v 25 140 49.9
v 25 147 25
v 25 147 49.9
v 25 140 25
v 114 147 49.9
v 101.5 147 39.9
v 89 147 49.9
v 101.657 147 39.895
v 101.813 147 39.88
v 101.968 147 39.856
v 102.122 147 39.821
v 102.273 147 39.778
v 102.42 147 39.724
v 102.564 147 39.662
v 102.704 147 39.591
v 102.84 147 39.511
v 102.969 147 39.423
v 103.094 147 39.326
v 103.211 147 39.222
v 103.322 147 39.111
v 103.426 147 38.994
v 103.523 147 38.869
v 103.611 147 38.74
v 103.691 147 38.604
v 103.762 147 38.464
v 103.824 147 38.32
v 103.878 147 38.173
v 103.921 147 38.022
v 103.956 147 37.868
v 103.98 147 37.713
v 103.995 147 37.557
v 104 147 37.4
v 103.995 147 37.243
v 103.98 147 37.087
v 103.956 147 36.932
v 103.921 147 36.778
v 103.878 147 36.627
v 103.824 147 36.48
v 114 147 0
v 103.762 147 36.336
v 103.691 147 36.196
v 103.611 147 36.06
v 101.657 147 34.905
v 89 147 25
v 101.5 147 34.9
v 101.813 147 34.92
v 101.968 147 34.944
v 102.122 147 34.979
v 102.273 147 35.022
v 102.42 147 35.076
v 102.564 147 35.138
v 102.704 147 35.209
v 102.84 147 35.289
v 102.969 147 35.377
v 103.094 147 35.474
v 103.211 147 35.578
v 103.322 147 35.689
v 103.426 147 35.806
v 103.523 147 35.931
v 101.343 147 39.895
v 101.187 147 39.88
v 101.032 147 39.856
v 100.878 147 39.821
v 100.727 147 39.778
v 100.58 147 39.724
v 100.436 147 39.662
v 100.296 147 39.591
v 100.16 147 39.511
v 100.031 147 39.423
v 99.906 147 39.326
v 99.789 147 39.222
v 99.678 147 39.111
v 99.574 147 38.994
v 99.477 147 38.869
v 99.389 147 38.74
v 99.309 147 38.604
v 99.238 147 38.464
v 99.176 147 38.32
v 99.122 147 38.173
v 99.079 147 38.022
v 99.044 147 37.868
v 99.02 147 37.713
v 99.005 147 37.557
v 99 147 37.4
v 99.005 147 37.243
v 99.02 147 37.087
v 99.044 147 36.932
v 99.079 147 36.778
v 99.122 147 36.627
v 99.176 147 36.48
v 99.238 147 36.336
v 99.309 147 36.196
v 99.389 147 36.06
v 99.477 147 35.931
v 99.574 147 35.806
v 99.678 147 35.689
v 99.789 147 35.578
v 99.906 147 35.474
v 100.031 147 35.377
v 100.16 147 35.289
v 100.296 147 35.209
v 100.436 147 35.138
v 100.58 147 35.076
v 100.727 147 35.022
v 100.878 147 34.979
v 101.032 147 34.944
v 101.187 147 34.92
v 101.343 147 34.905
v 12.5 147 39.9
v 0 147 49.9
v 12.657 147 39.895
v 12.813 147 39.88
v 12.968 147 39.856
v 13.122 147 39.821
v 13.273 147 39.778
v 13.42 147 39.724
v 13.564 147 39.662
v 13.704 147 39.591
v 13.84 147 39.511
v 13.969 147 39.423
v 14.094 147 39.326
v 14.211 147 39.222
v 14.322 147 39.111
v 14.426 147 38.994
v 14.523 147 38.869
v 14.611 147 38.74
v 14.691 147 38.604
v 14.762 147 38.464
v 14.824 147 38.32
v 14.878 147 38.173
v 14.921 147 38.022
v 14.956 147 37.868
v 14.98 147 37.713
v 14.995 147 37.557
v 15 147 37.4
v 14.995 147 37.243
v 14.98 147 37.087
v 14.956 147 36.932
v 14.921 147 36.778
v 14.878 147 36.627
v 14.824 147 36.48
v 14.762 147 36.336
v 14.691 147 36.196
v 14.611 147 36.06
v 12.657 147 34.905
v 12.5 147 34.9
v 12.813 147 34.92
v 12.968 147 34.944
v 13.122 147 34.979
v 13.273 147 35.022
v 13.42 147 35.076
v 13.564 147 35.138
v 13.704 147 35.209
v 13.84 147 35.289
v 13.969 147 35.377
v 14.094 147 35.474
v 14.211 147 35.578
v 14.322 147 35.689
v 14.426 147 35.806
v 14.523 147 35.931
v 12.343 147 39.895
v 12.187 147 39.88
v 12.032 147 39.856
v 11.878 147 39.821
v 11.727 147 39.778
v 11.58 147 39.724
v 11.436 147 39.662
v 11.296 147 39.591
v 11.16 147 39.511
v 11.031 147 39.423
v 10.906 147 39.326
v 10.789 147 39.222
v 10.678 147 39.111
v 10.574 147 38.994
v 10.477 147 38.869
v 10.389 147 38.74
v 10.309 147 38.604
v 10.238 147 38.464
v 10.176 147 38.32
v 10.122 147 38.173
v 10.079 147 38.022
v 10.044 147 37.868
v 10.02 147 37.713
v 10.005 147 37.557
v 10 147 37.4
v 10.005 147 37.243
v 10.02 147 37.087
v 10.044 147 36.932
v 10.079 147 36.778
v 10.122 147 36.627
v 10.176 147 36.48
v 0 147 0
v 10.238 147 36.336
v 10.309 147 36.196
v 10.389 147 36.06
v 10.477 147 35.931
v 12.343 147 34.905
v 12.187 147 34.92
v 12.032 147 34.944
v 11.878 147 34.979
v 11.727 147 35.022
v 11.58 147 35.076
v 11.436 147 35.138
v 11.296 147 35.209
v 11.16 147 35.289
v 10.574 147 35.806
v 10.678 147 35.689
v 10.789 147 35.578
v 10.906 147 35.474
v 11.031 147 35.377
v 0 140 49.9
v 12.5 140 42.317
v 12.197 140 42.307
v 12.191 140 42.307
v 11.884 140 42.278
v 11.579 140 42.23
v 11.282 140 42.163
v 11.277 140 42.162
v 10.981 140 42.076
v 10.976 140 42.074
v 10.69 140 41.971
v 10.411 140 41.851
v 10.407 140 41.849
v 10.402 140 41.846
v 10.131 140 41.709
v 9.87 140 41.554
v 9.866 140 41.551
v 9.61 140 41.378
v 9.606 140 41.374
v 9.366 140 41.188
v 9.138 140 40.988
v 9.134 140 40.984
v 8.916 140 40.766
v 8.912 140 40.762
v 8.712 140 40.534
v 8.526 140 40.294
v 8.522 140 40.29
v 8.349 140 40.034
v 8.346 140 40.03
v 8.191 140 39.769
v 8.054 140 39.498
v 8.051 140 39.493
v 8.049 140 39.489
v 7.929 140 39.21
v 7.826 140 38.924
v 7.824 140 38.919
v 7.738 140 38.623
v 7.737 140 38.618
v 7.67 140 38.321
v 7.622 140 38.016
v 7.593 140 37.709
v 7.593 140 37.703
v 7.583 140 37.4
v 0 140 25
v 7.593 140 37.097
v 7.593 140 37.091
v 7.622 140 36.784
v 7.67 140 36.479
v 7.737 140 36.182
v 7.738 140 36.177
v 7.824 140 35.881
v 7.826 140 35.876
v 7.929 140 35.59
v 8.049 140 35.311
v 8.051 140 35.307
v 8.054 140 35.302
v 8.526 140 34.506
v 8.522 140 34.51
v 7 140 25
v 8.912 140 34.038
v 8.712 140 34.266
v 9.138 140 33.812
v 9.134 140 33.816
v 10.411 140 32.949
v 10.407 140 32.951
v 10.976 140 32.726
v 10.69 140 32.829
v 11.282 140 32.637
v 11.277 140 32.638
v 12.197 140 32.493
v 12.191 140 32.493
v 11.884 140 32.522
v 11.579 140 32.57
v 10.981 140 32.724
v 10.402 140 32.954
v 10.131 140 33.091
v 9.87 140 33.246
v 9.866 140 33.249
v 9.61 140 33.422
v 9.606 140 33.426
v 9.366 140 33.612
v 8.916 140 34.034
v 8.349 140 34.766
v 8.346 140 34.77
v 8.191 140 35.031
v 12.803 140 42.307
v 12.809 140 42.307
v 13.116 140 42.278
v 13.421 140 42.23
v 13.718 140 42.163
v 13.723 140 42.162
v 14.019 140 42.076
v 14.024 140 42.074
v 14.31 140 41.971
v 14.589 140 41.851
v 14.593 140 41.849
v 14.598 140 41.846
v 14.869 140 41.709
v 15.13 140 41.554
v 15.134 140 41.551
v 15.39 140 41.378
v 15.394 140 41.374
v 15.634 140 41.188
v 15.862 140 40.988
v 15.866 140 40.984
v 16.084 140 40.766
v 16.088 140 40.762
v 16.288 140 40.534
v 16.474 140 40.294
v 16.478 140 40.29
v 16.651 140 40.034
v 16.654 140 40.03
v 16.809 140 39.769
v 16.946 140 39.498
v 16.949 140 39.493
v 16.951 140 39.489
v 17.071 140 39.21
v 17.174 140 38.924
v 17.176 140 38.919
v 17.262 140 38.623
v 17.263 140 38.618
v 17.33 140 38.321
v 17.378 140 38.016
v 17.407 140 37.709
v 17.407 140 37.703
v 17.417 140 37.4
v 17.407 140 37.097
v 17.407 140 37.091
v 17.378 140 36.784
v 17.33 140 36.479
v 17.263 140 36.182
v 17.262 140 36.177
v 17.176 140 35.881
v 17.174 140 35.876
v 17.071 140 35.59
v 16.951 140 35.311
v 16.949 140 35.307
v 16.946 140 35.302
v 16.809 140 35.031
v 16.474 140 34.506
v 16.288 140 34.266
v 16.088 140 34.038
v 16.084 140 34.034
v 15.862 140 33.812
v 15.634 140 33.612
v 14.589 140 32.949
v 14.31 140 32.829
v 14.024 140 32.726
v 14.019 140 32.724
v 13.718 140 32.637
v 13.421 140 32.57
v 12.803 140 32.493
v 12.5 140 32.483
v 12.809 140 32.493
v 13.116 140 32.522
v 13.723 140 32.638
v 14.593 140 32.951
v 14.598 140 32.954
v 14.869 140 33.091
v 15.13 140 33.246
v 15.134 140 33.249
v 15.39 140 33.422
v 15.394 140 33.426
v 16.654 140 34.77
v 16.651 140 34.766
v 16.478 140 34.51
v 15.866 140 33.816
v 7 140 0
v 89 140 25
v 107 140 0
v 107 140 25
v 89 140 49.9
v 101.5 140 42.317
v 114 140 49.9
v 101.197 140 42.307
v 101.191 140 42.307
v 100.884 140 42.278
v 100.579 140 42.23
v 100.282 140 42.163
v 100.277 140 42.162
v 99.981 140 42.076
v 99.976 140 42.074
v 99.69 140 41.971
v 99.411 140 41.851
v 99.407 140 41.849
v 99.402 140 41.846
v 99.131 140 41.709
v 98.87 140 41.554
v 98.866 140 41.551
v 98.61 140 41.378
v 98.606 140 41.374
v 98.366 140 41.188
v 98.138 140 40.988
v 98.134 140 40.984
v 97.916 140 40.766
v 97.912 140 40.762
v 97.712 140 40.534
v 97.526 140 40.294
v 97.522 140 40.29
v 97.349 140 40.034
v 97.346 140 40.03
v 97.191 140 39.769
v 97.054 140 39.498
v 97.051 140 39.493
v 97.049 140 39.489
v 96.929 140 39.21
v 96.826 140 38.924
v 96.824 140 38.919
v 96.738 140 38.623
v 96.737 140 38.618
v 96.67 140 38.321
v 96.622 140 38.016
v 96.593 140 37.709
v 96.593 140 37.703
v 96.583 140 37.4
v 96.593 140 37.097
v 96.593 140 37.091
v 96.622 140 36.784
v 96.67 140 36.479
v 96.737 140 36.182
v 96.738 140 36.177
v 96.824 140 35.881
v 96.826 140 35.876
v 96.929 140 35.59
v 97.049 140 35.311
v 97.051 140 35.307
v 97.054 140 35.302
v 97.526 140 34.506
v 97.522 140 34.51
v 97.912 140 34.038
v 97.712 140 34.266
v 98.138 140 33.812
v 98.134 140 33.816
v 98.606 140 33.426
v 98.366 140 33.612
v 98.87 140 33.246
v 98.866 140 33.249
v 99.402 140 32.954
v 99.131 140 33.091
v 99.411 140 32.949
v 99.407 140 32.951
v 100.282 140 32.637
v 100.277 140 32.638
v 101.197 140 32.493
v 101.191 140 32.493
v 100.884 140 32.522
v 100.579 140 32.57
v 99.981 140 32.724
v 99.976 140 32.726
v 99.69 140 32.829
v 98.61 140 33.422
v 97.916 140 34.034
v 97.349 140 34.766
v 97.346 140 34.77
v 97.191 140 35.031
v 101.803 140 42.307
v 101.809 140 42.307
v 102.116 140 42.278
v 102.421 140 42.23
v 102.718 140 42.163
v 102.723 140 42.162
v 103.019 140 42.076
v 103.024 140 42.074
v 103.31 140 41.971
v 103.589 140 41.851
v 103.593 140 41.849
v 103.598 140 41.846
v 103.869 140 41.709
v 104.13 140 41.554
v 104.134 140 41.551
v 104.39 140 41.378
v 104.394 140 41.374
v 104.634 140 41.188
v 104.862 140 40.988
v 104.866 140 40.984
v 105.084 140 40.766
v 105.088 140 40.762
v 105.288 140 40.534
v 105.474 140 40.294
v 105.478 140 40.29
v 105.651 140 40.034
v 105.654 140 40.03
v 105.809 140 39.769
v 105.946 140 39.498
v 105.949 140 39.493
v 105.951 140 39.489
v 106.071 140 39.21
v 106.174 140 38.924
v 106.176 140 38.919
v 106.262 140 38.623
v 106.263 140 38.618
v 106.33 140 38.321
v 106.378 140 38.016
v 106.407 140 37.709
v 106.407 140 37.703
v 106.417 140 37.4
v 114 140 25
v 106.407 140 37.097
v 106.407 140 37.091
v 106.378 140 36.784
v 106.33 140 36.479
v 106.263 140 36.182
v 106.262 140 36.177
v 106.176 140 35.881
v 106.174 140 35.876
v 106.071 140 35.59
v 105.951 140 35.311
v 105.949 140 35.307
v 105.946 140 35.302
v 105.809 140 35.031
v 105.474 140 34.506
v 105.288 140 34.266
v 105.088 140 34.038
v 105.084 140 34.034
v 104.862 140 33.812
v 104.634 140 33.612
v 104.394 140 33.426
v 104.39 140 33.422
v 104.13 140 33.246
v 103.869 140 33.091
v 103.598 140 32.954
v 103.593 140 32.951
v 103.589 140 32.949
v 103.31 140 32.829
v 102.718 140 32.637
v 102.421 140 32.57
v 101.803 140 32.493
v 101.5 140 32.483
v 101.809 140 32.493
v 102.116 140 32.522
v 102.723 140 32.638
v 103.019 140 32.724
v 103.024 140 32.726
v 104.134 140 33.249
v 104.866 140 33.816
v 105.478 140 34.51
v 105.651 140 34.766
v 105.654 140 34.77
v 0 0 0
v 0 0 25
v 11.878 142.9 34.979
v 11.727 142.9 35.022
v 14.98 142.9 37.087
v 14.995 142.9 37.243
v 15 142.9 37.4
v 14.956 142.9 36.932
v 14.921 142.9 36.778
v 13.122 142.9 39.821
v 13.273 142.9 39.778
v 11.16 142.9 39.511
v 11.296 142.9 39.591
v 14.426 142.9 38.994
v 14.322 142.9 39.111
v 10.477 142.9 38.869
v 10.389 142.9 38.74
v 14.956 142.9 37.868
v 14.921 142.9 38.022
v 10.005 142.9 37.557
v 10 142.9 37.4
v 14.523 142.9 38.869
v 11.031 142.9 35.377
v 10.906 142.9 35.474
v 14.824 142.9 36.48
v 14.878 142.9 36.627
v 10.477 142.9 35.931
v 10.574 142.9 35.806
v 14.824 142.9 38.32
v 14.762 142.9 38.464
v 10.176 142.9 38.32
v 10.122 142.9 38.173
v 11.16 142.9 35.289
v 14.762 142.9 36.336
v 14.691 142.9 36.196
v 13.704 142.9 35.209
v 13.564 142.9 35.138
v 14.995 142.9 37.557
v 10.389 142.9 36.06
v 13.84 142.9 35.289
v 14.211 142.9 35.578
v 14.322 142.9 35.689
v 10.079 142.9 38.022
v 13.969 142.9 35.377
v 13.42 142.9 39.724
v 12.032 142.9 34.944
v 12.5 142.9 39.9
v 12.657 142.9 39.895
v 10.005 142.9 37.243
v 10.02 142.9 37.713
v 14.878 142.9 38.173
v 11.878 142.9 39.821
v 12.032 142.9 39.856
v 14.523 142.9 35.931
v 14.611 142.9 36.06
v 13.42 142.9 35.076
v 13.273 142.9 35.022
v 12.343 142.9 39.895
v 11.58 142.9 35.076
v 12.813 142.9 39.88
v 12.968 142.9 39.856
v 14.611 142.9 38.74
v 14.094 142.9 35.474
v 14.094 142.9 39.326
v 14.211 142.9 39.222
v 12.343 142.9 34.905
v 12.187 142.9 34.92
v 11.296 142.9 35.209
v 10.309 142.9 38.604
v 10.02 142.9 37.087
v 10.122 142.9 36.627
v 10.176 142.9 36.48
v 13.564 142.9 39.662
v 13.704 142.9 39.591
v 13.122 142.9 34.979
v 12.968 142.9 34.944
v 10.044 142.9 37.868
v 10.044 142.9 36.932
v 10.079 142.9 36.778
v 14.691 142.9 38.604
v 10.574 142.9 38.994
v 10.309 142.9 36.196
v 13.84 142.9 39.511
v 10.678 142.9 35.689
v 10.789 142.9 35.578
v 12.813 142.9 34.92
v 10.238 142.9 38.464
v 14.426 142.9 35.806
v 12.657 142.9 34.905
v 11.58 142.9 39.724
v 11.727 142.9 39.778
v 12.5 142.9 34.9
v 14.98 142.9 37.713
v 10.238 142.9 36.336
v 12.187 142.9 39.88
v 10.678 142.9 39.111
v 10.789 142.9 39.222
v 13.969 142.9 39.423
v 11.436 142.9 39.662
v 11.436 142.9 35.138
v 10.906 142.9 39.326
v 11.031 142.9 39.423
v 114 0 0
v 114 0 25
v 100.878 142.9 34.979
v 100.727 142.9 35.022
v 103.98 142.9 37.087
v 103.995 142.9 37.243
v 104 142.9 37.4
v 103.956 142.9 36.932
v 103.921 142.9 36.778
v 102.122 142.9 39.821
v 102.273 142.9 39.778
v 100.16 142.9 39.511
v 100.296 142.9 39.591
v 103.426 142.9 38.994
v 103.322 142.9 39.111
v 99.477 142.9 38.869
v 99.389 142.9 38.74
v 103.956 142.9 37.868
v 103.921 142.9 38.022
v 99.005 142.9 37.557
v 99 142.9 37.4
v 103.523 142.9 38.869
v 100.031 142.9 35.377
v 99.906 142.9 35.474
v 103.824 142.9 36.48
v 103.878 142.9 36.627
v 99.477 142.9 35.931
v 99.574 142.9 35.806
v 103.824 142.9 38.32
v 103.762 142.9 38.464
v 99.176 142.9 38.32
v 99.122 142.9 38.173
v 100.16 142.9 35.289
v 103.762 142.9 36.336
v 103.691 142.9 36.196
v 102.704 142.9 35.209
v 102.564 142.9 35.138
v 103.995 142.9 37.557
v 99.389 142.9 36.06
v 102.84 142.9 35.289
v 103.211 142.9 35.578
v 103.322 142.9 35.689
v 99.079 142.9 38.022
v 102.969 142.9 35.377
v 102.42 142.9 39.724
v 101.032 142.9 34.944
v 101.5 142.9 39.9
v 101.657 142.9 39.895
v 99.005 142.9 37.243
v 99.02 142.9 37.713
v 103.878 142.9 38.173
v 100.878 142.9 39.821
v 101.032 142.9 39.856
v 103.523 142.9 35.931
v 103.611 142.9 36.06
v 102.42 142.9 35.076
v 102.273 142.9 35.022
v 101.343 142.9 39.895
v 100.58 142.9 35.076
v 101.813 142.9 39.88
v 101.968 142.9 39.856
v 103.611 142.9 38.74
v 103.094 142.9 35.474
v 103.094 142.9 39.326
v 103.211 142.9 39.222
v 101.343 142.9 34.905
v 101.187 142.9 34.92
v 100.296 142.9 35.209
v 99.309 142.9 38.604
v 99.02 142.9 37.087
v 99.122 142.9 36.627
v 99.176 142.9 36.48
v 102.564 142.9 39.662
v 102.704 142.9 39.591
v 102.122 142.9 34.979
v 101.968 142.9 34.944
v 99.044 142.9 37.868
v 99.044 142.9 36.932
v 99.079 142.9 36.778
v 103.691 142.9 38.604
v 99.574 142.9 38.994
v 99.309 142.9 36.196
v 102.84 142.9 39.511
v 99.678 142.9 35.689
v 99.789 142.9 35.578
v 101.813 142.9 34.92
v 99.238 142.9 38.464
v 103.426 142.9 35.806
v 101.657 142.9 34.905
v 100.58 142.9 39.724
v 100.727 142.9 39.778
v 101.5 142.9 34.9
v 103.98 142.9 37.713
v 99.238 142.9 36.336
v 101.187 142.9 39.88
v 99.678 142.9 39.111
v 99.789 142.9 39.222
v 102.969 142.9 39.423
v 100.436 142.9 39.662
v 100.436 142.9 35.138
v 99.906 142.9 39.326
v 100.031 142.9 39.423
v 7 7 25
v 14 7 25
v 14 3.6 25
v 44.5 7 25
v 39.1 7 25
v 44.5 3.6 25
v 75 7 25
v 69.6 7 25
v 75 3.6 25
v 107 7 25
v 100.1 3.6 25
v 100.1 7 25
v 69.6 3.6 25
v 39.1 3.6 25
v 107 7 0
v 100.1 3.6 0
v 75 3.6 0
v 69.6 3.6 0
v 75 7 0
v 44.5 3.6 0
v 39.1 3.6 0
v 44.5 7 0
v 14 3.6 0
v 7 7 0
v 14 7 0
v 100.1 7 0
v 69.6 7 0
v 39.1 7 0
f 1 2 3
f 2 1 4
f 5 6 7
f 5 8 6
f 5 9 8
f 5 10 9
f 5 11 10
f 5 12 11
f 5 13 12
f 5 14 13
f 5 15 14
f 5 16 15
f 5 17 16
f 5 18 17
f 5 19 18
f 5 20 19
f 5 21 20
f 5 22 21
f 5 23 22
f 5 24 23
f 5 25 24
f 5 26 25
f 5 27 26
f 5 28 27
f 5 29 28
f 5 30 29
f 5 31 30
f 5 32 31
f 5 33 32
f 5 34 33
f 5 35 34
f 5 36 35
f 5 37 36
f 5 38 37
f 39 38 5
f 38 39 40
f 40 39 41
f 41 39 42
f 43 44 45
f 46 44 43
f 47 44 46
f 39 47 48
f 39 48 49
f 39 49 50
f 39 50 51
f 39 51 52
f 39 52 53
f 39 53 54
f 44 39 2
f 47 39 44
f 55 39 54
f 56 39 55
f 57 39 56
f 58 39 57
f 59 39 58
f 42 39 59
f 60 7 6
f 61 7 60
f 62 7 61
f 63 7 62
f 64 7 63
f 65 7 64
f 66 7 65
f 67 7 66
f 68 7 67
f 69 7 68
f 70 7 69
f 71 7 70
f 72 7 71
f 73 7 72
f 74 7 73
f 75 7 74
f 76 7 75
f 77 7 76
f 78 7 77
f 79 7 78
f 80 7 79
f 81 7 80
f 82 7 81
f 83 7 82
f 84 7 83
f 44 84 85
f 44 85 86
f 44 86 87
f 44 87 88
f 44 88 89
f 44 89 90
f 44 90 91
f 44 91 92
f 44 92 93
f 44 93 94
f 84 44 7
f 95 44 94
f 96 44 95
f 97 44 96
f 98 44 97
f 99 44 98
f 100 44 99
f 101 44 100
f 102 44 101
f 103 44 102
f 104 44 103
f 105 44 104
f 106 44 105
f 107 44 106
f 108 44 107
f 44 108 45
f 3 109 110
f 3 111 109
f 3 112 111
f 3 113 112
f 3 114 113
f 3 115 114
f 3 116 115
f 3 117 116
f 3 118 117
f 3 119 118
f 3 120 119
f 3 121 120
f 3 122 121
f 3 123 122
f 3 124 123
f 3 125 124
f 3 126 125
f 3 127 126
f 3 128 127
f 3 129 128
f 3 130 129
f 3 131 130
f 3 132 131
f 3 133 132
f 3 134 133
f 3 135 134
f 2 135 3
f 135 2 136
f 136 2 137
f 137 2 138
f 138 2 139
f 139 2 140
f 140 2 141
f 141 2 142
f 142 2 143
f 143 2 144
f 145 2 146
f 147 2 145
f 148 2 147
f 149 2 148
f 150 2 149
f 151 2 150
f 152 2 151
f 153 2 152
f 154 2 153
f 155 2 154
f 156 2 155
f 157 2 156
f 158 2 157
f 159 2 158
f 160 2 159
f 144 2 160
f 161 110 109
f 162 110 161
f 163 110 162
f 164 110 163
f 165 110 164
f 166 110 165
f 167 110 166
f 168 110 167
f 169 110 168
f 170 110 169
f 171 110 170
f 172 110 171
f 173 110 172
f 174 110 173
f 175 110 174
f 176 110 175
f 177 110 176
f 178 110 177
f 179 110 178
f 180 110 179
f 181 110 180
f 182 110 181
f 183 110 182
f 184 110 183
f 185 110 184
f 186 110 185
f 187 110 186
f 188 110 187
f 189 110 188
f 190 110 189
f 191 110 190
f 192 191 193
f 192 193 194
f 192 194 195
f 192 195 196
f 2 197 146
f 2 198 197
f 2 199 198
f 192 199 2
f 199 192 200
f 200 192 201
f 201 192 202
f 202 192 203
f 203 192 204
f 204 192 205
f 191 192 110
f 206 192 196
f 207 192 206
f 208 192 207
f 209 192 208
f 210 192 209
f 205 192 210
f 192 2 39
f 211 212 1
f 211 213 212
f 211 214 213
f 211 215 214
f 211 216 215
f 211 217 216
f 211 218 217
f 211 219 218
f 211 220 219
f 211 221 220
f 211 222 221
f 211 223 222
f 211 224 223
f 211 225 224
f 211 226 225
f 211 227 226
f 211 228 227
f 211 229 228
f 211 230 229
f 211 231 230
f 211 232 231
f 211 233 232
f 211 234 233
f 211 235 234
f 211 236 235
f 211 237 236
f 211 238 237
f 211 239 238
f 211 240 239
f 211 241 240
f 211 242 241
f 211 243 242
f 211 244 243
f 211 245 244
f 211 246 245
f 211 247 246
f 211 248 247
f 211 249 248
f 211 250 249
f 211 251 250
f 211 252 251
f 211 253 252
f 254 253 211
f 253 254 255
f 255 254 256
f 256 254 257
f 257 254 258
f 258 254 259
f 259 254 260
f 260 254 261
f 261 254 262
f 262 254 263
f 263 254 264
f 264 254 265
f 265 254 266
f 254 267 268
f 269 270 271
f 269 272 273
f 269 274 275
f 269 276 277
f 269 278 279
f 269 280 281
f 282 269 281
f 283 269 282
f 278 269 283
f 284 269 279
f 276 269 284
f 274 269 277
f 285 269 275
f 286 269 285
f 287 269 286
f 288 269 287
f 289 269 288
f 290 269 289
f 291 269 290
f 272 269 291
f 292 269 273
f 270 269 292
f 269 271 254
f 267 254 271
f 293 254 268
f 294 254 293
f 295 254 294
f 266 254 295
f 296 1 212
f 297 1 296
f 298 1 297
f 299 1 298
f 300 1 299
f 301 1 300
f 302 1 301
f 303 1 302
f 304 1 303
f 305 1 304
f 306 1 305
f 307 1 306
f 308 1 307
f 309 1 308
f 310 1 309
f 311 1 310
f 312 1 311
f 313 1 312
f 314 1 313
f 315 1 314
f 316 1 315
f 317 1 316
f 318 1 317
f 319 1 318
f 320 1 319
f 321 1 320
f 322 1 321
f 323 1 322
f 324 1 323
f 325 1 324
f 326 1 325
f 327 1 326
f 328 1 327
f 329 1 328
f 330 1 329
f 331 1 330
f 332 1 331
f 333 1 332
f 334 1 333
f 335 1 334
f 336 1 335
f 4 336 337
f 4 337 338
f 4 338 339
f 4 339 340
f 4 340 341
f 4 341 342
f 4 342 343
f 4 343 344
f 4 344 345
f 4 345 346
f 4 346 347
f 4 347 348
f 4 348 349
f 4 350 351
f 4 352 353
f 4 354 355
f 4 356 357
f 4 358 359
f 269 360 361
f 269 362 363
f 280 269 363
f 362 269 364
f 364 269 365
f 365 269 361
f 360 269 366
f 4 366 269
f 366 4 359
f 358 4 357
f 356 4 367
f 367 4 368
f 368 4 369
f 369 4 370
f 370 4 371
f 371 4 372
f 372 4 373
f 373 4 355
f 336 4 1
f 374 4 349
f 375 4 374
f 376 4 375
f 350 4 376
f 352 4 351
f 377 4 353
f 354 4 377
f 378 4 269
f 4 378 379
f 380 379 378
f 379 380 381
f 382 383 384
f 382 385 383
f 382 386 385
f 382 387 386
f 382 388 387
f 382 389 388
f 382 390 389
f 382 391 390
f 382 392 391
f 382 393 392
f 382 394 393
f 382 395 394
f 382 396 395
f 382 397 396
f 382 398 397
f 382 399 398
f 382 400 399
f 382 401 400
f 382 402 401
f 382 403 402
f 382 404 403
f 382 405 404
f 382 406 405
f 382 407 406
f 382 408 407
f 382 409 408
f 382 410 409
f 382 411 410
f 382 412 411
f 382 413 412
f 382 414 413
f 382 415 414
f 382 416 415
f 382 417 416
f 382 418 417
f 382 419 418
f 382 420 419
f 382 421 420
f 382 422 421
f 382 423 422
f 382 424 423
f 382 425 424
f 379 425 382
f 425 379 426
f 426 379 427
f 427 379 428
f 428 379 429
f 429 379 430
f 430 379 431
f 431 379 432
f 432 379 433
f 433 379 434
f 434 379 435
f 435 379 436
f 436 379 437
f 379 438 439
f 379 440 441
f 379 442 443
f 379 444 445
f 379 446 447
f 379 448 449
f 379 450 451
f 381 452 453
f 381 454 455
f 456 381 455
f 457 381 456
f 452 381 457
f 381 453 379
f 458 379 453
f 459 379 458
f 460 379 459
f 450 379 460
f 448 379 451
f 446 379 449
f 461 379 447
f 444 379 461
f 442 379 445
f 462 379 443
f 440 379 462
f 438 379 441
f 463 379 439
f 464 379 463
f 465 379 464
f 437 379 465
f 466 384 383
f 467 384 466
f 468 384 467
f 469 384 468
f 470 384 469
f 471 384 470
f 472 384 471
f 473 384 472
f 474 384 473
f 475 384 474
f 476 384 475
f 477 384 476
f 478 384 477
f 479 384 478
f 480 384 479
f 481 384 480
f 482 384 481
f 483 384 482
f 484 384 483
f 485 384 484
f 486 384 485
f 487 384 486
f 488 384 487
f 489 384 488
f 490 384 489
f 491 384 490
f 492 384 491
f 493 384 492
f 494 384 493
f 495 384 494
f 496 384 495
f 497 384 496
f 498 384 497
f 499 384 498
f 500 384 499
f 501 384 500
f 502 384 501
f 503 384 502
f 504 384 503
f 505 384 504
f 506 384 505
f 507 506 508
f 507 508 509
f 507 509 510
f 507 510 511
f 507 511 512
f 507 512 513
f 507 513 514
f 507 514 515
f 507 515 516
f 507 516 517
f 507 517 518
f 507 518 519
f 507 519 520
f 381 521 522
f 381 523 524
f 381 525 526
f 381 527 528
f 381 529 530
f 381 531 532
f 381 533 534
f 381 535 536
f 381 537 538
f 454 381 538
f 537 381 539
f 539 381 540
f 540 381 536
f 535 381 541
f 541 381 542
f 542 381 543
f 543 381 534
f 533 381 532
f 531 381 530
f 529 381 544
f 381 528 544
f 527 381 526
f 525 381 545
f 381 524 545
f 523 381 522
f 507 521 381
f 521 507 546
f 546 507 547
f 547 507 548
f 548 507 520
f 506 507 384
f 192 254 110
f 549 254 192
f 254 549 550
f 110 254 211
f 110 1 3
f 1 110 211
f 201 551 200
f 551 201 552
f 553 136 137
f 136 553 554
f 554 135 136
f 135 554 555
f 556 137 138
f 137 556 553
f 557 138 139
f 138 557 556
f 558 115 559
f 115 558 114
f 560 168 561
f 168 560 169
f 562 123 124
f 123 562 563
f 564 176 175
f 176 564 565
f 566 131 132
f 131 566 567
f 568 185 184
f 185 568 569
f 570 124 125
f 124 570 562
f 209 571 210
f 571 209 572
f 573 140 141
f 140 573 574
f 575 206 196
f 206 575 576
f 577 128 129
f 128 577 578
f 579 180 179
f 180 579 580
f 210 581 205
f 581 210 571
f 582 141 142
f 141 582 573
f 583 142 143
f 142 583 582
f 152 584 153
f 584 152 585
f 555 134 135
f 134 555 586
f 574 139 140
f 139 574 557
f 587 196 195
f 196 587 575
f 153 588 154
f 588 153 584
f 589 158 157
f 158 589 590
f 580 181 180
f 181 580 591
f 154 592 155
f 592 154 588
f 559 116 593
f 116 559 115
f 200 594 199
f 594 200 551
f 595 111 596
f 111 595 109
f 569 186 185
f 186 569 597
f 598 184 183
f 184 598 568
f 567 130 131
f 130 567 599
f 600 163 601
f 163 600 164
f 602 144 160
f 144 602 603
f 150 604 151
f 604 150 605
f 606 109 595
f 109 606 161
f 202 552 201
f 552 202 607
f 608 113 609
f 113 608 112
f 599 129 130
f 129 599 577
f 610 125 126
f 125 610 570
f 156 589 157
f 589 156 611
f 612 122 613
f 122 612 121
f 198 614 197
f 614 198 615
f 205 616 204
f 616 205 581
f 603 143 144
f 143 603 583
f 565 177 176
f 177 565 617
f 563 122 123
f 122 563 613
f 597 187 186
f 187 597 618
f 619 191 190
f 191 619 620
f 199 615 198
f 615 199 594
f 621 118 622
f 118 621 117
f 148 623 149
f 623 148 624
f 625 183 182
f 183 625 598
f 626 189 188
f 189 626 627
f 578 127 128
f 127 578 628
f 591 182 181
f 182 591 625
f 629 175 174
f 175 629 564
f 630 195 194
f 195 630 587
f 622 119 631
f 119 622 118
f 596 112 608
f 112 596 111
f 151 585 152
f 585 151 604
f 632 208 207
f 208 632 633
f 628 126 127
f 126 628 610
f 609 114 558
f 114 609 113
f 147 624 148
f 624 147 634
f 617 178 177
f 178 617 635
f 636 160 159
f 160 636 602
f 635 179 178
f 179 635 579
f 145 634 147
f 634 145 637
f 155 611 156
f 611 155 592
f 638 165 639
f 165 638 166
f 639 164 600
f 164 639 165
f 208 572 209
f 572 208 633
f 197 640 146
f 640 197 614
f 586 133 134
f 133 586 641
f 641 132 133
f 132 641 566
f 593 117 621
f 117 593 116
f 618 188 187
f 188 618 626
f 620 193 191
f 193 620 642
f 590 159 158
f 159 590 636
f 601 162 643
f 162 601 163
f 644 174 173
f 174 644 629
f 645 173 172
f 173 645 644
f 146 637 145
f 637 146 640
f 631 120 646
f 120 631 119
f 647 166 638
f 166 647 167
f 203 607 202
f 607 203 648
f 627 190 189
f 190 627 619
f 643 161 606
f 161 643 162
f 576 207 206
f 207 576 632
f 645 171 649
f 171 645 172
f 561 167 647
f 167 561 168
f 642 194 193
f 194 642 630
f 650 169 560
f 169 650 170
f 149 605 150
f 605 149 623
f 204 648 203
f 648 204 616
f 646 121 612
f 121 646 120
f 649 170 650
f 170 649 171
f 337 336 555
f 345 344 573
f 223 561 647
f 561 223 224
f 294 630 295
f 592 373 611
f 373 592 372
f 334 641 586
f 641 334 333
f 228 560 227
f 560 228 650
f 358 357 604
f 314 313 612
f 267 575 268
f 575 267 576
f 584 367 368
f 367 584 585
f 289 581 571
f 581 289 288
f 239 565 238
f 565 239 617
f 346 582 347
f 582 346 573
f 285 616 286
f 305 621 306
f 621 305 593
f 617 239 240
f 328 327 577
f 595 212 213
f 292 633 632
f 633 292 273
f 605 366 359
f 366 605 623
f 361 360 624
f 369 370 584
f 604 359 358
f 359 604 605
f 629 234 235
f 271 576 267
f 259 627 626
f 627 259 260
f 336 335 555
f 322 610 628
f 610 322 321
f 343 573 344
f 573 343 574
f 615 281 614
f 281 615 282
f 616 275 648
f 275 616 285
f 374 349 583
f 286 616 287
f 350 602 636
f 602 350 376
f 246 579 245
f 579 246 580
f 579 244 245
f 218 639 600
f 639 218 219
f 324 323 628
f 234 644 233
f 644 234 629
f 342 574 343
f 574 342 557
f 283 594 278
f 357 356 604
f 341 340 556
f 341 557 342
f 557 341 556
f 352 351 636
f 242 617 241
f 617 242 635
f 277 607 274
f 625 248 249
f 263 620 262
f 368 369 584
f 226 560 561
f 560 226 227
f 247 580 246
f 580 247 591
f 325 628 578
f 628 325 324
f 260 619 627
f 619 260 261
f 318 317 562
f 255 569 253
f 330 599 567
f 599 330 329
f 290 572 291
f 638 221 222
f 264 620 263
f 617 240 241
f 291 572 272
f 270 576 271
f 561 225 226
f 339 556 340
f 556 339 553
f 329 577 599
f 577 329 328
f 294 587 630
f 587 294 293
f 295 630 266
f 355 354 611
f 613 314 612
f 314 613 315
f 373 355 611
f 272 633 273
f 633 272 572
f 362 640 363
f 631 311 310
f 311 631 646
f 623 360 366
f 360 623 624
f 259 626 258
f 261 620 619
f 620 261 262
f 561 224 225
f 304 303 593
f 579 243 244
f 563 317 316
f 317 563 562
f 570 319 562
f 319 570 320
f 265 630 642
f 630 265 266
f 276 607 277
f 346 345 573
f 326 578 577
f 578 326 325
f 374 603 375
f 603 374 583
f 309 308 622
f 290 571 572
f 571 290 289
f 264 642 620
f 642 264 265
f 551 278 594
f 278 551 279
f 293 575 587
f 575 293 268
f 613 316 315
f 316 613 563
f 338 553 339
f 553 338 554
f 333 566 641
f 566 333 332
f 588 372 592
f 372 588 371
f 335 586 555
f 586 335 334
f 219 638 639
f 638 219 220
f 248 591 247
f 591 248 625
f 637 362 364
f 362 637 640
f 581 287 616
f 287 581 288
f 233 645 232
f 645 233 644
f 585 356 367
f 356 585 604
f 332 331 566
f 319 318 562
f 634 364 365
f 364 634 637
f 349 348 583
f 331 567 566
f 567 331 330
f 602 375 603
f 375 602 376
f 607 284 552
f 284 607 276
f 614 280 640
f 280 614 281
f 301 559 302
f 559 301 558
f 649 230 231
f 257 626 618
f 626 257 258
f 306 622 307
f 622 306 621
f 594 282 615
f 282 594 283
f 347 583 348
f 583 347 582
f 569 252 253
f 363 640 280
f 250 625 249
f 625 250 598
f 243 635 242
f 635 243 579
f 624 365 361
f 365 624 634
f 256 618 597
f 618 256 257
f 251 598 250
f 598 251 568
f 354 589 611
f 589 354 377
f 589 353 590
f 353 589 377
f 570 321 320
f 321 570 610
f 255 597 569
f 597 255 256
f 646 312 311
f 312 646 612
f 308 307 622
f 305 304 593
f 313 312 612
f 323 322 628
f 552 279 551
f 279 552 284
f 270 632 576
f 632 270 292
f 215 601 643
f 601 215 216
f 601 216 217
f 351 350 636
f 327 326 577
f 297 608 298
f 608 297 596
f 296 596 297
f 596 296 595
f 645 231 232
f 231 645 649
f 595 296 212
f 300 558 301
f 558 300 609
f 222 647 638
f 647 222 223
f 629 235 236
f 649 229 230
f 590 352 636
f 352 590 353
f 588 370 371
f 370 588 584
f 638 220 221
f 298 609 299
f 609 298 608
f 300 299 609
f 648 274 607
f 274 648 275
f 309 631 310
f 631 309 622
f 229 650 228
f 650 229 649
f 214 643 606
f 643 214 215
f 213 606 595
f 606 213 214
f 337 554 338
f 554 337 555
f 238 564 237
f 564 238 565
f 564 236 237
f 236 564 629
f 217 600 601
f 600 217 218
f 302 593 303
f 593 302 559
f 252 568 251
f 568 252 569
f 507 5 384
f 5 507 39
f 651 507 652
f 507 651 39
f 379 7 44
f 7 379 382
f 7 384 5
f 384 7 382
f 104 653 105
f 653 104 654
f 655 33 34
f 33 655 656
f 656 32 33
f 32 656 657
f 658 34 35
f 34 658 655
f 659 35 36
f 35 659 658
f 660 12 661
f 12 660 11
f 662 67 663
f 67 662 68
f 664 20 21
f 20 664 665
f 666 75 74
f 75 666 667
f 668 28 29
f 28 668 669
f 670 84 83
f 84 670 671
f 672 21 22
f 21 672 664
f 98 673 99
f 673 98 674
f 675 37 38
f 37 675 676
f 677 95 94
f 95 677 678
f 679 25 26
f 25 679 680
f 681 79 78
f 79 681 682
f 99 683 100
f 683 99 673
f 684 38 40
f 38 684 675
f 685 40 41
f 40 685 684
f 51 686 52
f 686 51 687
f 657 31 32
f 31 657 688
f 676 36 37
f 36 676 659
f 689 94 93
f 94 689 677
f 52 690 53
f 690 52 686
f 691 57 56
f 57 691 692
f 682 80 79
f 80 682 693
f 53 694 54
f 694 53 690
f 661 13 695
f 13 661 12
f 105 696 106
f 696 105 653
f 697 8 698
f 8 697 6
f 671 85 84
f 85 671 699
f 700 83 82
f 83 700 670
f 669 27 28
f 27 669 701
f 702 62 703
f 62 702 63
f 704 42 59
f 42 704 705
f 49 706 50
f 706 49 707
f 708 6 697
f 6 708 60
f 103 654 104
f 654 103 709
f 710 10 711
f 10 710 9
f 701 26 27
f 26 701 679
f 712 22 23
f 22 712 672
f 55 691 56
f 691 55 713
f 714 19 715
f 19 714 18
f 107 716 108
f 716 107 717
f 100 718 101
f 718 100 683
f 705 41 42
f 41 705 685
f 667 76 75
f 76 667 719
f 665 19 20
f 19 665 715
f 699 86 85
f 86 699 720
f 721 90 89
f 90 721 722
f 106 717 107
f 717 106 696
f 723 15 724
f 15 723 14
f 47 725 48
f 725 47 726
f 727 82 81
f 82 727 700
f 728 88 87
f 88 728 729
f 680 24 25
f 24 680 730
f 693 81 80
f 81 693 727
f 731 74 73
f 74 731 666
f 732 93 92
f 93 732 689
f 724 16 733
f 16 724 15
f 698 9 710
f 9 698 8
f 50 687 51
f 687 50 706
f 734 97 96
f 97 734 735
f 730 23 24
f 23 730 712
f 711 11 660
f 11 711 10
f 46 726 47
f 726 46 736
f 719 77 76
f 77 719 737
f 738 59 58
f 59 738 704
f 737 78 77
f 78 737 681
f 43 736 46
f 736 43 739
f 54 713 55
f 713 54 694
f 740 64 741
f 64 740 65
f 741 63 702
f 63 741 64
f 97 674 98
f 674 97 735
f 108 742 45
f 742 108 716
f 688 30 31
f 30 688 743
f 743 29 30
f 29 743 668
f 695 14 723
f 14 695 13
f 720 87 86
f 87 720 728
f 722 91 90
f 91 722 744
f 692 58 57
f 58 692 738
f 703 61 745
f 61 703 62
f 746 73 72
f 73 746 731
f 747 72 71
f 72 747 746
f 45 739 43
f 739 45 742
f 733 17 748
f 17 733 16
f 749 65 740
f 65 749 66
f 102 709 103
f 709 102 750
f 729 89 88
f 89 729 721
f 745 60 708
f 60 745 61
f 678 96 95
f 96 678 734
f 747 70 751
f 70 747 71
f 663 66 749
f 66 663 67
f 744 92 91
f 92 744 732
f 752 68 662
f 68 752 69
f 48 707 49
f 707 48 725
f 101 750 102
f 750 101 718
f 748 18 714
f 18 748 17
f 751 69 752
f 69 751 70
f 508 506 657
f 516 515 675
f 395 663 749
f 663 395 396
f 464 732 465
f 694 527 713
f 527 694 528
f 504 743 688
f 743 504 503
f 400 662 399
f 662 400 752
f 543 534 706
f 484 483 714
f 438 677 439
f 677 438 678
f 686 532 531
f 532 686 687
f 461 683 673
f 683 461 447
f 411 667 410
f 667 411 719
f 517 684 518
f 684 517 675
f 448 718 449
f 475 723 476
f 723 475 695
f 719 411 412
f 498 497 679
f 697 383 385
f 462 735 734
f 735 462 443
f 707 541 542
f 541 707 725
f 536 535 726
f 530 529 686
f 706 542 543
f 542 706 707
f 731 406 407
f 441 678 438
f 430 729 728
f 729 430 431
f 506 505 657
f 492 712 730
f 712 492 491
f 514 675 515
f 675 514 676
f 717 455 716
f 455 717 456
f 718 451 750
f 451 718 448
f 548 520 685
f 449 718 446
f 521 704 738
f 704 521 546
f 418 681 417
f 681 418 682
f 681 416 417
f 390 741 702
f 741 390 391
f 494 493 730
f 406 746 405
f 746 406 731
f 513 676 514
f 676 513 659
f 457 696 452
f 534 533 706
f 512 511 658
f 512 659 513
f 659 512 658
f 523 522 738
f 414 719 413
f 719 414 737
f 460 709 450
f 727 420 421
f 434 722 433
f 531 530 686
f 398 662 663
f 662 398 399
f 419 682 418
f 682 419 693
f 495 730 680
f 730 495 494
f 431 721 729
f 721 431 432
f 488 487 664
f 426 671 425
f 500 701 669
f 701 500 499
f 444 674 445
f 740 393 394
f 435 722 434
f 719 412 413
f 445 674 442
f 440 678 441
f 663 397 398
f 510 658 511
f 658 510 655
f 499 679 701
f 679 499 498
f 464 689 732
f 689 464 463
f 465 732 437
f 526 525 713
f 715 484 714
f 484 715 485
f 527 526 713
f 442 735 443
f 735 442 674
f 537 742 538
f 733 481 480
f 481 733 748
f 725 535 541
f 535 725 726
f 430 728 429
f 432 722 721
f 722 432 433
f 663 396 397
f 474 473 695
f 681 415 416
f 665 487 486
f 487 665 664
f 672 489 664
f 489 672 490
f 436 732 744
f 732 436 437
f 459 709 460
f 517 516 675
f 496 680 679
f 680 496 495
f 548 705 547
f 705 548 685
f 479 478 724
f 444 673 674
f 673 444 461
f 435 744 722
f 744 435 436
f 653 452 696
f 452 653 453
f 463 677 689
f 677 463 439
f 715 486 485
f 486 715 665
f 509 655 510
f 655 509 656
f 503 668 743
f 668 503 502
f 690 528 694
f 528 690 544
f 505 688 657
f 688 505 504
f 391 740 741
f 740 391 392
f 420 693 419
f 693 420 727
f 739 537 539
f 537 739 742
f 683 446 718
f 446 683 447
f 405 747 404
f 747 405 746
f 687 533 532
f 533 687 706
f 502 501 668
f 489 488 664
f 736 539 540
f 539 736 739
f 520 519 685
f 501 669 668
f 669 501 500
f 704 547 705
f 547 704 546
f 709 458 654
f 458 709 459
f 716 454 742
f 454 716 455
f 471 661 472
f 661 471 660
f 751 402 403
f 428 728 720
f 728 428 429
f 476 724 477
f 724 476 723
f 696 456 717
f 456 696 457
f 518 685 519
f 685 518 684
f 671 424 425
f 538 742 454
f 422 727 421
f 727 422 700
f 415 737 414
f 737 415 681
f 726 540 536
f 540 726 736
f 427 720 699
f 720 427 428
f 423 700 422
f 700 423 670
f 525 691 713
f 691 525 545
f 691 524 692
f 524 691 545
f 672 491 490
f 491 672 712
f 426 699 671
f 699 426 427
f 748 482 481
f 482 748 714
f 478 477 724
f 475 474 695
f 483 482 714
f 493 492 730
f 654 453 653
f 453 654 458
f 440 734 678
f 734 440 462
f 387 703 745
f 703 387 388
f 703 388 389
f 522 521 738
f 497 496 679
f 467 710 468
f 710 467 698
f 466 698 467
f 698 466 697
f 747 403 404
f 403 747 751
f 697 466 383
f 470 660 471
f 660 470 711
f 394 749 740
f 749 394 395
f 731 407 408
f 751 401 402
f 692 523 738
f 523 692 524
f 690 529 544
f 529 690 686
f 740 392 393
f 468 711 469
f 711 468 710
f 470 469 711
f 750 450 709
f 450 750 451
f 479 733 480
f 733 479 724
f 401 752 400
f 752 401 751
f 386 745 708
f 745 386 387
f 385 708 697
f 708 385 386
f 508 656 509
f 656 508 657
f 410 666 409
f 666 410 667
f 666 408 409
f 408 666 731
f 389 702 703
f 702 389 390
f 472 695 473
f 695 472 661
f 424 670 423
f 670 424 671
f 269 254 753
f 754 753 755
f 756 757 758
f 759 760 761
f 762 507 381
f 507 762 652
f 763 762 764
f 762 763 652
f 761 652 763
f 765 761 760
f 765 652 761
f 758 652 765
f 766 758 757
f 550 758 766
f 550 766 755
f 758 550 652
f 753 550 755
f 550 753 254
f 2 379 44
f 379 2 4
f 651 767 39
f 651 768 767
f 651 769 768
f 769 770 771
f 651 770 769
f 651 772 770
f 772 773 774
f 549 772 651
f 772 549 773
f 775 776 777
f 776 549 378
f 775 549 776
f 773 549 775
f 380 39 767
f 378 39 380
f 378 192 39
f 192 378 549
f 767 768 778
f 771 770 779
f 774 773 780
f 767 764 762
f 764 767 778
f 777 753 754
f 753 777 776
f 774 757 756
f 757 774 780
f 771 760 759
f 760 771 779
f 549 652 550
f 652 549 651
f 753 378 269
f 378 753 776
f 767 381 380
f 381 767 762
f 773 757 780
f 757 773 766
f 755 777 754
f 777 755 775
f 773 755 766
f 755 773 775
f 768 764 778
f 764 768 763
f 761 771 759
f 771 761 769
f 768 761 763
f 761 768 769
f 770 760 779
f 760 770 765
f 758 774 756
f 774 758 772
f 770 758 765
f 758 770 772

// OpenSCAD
// simple shelf to hold the bit screwdrivers
// the selves will be attached to a larger IKEA shelf systemwith screws from below
// the surroundig boxes for the two sets are:
// (depth, depth stop, height, width)
// 220, 190, 100, 200 (mm)
// 220, 170, 70, 140 (mm)

material_width = 7; // mm
shelf_depth = 220;
shelf1_depth_stop = 190;


shelf2_depth_stop = 170;


rail_depth = 25;
ear_length = 25;

epsilon = 0.1;

module ear() {
    difference() {
        translate([0, 0, material_width / 2])
            cube([ear_length, ear_length, material_width], center = true);
        translate([0, 0, - epsilon])
            cylinder(d = 5, h = material_width + 2 * epsilon, $fn = 100);
        translate([0, 0, - epsilon])
            cylinder(d1 = 10, d2 = 5, h = 3, $fn = 100);
    }
}
rail(100, 140);
module rail(width, height) {
    difference() {
        union() {
            // the bottom rail
            cube([width + 2 * material_width, material_width, rail_depth]);

            // the sides of the rail
            cube([material_width, height + material_width, rail_depth]);
            translate([width + material_width, 0, 0])
                cube([material_width, height + material_width, rail_depth]);

            // the top rail
            translate([0, height, 0])
                cube([width + 2 * material_width, material_width, rail_depth]);

            // the ears to hold the rail in place with screws
            translate([ear_length / 2, height, ear_length / 2 + rail_depth - epsilon])
                rotate([- 90, 0, 0])
                    ear();
            translate([width + 2* material_width - ear_length / 2, height, ear_length / 2 + rail_depth - epsilon])
                rotate([- 90, 0,])
                    ear();
        }
        translate([material_width * 2, material_width / 2 + epsilon, - epsilon])
            cube([rail_depth + epsilon, material_width / 2 + epsilon, rail_depth + 2 * epsilon]);
        translate([width - rail_depth, material_width / 2 + epsilon, - epsilon])
            cube([rail_depth + epsilon, material_width / 2 + epsilon, rail_depth + 2 * epsilon]);
        translate([width / 2 - rail_depth / 2 + material_width, material_width / 2 + epsilon, - epsilon])
            cube([rail_depth + epsilon, material_width / 2 + epsilon, rail_depth + 2 * epsilon]);
    }
}

module bottom() {
    difference() {
        cube([shelf_depth, rail_depth, material_width]);
        translate([- epsilon, - epsilon, - epsilon])
            cube([rail_depth + epsilon, rail_depth + 2 * epsilon, material_width / 2 + epsilon]);
        translate([shelf_depth - rail_depth + epsilon, - epsilon, - epsilon])
            cube([rail_depth + epsilon, rail_depth + 2 * epsilon, material_width / 2 + epsilon]);
    }
}
